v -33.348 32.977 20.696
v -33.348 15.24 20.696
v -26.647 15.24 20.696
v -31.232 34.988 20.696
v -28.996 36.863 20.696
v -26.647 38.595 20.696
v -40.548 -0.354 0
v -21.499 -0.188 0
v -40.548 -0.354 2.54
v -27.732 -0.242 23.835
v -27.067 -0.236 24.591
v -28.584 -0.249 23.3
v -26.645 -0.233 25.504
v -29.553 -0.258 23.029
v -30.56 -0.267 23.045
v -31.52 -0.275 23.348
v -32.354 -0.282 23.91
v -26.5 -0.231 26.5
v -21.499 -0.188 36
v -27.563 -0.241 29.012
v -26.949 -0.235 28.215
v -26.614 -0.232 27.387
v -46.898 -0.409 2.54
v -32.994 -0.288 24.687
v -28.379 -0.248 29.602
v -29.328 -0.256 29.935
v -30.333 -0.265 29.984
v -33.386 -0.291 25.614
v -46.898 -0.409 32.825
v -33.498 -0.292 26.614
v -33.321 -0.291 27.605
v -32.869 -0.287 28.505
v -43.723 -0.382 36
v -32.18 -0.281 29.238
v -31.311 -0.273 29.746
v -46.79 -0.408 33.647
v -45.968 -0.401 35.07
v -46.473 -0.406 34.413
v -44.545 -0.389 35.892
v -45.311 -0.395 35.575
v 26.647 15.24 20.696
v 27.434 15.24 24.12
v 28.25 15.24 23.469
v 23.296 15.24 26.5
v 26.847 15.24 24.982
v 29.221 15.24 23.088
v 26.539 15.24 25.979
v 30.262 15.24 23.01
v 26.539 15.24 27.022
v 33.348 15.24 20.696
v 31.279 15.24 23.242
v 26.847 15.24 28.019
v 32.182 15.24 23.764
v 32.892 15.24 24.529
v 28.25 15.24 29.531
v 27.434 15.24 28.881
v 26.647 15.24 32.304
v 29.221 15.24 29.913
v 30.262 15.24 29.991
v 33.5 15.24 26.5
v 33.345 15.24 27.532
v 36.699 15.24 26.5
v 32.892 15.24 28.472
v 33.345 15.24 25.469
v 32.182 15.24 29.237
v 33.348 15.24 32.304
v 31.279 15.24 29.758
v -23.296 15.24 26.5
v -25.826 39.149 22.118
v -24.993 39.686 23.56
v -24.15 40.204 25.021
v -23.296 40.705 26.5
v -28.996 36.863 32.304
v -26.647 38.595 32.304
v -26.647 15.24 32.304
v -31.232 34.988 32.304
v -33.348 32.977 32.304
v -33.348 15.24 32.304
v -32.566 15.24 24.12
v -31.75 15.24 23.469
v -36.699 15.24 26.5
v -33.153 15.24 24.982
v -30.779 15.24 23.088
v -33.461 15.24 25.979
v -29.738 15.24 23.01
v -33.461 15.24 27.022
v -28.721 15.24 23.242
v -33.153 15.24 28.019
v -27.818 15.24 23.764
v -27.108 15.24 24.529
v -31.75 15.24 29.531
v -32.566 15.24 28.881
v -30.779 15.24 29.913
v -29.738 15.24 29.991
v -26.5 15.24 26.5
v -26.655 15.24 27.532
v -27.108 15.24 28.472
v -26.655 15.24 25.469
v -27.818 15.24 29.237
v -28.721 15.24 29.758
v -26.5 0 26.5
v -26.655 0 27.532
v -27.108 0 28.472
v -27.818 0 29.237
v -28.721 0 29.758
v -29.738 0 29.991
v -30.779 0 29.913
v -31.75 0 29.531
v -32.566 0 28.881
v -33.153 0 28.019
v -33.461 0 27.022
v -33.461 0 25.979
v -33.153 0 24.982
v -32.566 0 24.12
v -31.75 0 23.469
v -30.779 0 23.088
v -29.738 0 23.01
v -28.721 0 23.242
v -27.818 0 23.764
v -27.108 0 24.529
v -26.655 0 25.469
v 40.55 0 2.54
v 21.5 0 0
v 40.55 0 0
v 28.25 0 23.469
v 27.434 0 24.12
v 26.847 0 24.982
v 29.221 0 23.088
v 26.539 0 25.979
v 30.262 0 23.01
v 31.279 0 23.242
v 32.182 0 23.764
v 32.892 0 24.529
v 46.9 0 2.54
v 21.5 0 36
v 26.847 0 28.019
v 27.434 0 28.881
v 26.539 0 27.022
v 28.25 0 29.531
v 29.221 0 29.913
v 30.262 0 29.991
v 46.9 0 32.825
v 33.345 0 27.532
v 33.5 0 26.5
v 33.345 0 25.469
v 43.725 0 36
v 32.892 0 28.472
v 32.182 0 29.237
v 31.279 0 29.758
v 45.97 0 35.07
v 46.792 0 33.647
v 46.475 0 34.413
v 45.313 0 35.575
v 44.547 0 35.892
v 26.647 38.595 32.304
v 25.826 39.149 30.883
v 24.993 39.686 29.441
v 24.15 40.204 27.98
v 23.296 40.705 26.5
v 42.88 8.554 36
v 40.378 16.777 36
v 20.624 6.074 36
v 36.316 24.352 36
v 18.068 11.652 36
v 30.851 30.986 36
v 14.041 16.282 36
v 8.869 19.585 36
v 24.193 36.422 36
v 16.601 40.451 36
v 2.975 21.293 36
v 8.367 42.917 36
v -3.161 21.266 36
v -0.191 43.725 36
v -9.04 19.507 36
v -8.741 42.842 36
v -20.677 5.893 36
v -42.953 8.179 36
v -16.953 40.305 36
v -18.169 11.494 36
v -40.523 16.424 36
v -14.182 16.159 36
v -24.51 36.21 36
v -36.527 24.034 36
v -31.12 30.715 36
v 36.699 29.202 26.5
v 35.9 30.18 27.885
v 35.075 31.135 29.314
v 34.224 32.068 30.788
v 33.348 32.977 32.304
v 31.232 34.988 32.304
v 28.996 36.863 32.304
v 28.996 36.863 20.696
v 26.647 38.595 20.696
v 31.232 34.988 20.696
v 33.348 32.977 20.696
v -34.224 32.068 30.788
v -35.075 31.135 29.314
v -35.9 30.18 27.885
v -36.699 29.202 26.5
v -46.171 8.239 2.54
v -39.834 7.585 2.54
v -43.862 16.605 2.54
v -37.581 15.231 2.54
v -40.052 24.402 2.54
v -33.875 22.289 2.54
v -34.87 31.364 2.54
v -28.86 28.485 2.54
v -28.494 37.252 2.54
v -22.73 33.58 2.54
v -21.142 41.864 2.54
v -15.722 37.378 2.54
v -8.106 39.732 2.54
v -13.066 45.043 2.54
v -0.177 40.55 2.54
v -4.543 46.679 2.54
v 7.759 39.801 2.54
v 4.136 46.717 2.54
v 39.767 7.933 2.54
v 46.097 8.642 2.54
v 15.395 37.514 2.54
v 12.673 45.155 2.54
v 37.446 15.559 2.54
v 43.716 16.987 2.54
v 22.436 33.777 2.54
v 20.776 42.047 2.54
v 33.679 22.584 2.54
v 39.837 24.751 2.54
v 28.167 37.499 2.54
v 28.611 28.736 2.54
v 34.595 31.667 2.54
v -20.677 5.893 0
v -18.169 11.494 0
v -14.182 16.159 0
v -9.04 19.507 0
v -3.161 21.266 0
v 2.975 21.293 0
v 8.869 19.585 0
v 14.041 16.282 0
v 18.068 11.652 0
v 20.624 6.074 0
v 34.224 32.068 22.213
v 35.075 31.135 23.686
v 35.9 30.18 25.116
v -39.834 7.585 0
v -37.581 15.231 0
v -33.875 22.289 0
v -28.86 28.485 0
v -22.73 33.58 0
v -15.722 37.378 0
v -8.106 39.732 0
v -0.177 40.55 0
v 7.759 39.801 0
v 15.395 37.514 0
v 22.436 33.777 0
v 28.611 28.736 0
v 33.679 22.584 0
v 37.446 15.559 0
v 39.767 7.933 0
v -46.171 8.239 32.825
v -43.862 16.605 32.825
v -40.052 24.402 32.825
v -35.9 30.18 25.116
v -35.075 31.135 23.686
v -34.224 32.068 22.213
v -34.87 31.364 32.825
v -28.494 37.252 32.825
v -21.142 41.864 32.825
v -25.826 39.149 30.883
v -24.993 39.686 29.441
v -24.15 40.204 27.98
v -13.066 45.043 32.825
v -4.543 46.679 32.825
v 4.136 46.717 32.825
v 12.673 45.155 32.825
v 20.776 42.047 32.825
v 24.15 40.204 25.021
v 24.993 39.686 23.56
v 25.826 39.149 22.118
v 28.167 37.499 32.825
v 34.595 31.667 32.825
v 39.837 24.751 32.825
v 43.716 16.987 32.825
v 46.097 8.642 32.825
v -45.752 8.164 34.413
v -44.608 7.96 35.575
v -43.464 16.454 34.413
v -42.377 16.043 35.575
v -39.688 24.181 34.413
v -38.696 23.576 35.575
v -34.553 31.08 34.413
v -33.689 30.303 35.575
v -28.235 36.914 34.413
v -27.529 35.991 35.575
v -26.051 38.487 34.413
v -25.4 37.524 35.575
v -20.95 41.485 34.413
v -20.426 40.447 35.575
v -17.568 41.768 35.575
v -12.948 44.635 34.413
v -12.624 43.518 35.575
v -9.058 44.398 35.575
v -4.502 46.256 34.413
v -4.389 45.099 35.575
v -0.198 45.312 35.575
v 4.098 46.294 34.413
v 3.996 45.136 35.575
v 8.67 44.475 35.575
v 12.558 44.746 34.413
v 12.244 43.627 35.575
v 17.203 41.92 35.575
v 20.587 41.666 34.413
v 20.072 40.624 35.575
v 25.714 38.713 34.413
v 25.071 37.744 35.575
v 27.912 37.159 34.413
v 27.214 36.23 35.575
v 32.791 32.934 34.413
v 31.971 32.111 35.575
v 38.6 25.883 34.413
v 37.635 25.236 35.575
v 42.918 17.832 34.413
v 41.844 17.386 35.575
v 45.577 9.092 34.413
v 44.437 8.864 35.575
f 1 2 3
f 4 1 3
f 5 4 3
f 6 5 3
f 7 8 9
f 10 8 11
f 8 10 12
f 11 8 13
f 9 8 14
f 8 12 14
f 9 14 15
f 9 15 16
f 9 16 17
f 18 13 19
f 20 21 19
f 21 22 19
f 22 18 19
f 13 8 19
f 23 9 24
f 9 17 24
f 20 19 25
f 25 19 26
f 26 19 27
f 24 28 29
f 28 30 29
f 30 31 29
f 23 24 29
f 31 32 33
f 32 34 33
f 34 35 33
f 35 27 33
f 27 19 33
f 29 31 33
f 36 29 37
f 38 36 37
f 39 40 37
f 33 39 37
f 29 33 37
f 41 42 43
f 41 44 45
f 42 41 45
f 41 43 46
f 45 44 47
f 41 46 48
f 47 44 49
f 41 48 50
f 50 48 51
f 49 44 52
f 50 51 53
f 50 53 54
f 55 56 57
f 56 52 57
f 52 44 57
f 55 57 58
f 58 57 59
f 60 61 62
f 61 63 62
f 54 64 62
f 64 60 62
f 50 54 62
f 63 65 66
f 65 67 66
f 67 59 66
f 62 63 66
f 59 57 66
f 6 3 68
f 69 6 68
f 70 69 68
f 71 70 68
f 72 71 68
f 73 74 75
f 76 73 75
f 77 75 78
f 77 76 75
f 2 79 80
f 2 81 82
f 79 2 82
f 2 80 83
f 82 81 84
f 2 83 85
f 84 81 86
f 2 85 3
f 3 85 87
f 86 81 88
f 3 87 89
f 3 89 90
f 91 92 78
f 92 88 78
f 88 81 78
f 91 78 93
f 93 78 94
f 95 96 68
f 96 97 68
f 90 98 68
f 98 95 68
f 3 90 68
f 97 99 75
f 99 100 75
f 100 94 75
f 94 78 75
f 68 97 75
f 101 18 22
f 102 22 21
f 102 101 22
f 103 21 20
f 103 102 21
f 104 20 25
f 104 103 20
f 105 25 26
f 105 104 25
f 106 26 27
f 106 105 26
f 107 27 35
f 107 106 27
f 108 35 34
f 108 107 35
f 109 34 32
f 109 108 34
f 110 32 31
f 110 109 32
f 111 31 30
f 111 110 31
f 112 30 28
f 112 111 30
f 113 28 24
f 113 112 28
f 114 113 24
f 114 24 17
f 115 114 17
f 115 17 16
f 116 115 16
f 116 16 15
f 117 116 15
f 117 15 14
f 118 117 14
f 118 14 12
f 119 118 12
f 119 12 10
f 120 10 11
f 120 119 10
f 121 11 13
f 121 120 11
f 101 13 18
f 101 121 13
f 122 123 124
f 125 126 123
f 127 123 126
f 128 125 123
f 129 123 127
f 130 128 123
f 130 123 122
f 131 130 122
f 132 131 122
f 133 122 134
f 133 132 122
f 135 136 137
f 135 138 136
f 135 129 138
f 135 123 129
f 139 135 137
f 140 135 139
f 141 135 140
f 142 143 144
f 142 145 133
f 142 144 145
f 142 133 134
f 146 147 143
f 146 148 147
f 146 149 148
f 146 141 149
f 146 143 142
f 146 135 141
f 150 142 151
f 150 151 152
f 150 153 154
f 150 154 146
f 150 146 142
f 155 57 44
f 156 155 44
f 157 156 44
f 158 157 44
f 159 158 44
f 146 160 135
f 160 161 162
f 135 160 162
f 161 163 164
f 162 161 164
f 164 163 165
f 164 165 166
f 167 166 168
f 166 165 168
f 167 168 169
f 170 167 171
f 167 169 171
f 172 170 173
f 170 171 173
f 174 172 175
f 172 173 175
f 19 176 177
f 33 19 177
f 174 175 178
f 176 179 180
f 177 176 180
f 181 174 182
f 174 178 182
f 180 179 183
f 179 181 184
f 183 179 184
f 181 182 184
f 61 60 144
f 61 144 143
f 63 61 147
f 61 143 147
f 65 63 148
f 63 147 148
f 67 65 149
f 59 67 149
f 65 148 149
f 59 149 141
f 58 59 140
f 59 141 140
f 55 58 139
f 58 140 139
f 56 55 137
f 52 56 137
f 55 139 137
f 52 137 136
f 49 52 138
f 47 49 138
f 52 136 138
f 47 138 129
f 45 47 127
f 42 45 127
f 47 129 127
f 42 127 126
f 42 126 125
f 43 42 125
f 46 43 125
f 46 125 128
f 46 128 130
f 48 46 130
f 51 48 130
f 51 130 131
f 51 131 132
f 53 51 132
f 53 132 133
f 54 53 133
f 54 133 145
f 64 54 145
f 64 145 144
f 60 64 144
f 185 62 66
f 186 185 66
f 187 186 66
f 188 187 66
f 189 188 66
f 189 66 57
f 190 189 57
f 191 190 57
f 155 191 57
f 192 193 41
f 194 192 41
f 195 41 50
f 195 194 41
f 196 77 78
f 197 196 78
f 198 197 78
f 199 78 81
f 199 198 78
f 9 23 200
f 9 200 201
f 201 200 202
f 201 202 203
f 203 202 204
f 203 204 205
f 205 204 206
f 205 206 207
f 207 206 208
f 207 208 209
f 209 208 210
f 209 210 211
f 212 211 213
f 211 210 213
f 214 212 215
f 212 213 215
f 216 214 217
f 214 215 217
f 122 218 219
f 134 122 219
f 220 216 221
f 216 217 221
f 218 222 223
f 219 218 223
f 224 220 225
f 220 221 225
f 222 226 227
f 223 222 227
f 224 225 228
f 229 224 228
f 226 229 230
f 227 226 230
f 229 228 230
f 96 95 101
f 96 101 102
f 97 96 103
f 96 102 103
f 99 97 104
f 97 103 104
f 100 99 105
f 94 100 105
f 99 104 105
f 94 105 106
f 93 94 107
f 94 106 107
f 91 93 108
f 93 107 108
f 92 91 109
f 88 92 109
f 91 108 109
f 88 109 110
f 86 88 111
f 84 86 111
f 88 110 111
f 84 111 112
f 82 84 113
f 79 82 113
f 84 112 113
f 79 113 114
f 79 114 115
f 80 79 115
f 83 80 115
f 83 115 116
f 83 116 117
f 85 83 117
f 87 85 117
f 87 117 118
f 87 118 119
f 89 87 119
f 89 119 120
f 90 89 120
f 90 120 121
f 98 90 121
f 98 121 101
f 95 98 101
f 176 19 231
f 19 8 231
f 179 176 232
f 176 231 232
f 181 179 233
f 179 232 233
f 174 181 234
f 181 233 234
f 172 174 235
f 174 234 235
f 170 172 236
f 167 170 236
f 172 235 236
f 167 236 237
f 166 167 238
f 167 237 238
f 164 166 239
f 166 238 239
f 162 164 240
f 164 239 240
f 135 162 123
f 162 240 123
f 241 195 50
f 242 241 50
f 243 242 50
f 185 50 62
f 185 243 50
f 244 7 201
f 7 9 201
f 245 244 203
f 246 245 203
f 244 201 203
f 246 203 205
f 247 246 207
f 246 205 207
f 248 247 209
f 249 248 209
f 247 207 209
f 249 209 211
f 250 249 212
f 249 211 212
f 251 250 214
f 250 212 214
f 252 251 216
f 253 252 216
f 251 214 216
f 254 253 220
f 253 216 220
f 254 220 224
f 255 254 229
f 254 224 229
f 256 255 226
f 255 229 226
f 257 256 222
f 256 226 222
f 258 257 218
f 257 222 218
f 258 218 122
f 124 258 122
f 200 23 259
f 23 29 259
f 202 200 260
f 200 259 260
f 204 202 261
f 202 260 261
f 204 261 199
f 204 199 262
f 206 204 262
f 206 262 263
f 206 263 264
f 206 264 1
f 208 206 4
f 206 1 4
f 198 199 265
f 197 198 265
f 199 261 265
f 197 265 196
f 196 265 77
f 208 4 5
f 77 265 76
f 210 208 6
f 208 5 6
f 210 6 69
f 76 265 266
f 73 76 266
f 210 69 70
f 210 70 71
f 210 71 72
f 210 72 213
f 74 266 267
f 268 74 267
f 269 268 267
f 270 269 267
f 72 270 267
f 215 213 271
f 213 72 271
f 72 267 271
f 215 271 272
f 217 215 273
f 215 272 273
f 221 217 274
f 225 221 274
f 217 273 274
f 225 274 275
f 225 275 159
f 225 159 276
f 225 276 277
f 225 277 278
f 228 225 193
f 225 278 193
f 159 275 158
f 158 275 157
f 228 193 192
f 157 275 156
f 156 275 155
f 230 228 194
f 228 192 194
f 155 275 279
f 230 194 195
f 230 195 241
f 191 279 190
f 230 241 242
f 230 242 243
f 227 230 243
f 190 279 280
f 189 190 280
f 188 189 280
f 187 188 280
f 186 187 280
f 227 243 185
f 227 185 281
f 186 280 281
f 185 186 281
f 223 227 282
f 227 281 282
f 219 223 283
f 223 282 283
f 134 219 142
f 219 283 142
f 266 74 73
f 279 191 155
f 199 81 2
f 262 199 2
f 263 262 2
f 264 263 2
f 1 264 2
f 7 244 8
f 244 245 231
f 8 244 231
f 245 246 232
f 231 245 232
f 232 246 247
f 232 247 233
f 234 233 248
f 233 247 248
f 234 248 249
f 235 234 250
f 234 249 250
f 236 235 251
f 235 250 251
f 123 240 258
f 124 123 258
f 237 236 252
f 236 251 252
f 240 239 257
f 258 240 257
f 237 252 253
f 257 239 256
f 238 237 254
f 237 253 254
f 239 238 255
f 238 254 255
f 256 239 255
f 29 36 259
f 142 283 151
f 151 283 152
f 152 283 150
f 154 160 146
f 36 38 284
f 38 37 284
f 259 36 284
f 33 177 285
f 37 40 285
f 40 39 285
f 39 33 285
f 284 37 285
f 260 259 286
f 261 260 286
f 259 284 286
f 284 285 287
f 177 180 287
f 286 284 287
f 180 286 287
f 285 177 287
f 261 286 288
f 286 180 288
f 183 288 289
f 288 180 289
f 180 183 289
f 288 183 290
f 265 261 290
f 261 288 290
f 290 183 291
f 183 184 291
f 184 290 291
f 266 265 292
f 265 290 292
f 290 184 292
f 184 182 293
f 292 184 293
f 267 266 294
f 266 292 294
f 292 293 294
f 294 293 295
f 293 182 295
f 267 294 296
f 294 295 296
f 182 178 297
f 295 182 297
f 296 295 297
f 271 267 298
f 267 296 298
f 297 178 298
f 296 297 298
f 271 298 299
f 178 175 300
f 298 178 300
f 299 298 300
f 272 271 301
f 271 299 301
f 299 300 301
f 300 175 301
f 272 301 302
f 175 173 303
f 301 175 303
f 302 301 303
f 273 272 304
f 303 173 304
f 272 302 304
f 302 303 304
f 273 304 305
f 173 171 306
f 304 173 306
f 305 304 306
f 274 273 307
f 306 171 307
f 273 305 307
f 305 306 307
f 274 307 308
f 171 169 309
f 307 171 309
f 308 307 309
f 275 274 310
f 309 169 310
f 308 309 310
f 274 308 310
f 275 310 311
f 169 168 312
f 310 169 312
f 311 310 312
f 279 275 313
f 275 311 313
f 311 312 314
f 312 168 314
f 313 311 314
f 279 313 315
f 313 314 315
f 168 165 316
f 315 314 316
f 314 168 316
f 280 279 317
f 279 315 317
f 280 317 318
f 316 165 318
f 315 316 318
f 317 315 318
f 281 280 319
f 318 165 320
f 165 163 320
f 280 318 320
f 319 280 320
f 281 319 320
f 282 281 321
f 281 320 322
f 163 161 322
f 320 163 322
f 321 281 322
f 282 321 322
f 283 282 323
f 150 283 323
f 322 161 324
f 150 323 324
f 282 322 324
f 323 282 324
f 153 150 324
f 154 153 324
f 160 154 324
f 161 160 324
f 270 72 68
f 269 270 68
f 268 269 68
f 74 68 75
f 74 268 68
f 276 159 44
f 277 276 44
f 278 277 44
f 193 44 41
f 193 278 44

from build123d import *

# Parameters (mm, degrees)
F1_ANGLE_BACK = 180.5
F1_ANGLE      = 180.5
F2_R          = 3.5
F3_DEPTH      = 53.34
F3_DEPTH_BACK = 2.54
F6_DEPTH      = 35.56


# Not quite as in the source:
# - a feature names something its author has since deleted; it is built from what else it names


with BuildPart() as f1:
    # F0 (on Front) → F1 (revolve)
    with BuildSketch(Plane.XZ, mode=Mode.PRIVATE) as f1_sk:
        with BuildLine():
            Line((21.5, 36), (21.5, 0))
            Line((21.5, 0), (40.55, 0))
            Line((40.55, 0), (40.55, 2.54))
            Line((40.55, 2.54), (46.9, 2.54))
            Line((46.9, 2.54), (46.9, 32.825))
            ThreePointArc((46.9, 32.825), (45.9700640303, 35.0700640303), (43.725, 36))
            Line((43.725, 36), (21.5, 36))
        make_face()
    revolve(f1_sk.sketch.rotate(Axis((0, 0, -0.0018208164), (0, 0, -1)), -F1_ANGLE_BACK), axis=Axis((0, 0, -0.0018208164), (0, 0, -1)), revolution_arc=F1_ANGLE)

    # F2 (on Front) → F3 (cut, two sides)
    with BuildSketch(Plane.XZ) as f3_sk:
        with Locations((30, 26.5004)):
            Circle(F2_R)
        with Locations((-30, 26.5004)):
            Circle(F2_R)
    extrude(amount=-F3_DEPTH, mode=Mode.SUBTRACT)
    extrude(f3_sk.sketch, amount=F3_DEPTH_BACK, mode=Mode.SUBTRACT)

    # F5 (on offset) → F6 (cut)
    with BuildSketch(Plane.XZ.offset(-50.8)):
        Polygon((36.6991664547, 26.5004), (33.3482832273, 32.3043), (26.6465167727, 32.3043), (23.2956335453, 26.5004), (26.6465167727, 20.6965), (33.3482832273, 20.6965), align=None)
        Polygon((-33.3482832273, 32.3043), (-36.6991664547, 26.5004), (-33.3482832273, 20.6965), (-26.6465167727, 20.6965), (-23.2956335453, 26.5004), (-26.6465167727, 32.3043), align=None)
    extrude(amount=F6_DEPTH, mode=Mode.SUBTRACT)


solid = f1.part
